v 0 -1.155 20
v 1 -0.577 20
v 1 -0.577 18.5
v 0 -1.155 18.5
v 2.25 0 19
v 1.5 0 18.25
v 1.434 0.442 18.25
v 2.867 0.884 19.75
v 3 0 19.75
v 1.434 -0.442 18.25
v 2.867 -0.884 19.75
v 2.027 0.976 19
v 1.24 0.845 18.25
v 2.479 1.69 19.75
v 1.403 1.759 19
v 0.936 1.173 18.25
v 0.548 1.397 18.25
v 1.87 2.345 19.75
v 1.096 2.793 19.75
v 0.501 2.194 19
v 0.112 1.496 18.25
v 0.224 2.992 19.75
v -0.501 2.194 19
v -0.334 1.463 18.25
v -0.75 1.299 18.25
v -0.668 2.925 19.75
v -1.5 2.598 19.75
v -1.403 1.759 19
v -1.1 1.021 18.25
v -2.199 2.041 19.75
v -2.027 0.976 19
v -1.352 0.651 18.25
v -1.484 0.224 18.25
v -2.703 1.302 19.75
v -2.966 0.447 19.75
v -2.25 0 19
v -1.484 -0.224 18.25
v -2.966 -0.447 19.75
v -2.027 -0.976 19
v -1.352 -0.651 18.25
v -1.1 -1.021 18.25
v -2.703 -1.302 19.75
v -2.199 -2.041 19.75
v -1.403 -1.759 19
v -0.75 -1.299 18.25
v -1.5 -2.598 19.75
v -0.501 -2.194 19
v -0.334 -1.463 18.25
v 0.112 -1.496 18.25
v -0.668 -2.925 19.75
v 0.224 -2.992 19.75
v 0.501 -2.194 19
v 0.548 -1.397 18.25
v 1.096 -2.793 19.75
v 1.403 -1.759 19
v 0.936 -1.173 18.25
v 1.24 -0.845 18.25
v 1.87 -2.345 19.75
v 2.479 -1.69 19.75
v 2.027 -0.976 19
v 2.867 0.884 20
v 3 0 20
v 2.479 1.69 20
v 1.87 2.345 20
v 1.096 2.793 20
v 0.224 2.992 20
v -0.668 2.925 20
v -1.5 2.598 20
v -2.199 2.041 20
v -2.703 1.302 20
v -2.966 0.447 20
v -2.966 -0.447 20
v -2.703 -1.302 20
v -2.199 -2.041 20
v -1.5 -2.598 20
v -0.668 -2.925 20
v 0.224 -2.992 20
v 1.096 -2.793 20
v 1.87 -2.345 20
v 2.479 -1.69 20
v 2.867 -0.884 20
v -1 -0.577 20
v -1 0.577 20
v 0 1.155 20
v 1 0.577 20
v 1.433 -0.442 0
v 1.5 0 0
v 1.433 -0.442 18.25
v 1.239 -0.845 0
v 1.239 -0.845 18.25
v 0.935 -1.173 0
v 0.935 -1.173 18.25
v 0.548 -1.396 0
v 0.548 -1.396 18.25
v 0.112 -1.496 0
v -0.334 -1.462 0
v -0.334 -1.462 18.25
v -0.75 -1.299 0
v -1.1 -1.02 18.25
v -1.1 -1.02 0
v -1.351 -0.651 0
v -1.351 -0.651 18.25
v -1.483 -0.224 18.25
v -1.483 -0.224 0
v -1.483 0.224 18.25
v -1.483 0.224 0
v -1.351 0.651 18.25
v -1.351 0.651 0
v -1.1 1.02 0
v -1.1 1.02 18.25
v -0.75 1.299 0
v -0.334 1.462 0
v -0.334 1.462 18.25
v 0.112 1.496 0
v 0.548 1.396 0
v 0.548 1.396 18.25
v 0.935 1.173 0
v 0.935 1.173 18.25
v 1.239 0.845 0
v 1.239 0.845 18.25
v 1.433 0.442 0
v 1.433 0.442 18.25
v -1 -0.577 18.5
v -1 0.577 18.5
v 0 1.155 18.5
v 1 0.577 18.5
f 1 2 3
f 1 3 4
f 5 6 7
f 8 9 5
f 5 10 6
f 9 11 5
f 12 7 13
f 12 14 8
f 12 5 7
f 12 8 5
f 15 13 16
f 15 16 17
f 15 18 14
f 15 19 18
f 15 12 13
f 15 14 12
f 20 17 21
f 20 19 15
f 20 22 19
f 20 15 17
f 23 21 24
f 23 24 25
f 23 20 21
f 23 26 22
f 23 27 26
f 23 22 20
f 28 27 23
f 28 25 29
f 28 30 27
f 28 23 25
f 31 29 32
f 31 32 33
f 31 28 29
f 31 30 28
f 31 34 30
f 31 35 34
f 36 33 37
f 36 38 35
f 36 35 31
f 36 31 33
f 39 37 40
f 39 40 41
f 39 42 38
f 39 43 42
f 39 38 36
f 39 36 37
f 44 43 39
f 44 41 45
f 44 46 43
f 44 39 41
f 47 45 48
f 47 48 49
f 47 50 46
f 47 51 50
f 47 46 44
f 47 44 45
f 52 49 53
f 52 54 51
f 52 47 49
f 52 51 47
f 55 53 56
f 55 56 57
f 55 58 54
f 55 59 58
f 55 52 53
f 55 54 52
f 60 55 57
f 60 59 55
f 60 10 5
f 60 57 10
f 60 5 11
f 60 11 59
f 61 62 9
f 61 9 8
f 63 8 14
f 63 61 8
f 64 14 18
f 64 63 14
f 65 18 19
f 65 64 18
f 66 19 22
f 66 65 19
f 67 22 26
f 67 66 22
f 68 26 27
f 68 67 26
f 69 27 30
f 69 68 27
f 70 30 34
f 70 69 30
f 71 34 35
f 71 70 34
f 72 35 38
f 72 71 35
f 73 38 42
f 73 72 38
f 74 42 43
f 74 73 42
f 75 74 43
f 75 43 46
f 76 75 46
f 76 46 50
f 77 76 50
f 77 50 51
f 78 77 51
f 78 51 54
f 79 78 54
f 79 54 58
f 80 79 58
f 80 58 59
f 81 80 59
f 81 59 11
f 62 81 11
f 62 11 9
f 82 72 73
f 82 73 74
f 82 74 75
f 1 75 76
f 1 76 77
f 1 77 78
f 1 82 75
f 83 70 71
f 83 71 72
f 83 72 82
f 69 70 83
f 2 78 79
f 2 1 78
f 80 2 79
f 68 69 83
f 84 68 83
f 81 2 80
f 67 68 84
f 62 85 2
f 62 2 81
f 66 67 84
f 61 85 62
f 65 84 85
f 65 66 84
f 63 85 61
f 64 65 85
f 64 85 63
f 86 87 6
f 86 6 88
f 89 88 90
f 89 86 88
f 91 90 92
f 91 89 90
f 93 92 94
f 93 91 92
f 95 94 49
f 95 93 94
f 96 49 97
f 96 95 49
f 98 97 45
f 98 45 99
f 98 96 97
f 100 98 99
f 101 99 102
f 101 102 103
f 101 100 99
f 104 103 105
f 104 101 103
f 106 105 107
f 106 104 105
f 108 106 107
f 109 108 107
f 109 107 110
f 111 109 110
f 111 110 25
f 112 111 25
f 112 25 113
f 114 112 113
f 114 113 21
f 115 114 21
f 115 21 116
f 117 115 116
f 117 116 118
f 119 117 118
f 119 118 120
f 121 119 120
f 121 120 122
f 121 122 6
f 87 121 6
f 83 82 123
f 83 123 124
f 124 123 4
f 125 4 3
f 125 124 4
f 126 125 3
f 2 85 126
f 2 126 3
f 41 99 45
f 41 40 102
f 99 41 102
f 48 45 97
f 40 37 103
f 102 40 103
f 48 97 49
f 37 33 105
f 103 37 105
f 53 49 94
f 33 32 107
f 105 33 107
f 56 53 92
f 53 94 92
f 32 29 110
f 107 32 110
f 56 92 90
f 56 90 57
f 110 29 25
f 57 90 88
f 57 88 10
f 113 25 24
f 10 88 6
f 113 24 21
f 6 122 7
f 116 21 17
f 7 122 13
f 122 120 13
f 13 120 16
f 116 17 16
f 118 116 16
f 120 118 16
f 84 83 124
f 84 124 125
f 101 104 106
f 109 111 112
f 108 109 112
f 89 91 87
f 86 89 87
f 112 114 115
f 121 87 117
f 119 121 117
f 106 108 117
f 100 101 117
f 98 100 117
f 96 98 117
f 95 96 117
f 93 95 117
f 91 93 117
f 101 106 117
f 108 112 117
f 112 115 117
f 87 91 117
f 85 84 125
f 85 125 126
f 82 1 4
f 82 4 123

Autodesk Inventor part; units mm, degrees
ref_plane "YZ Plane" through (0, 0, 0) normal (1, 0, 0) x (0, 1, 0)
ref_plane "XZ Plane" through (0, 0, 0) normal (0, 1, 0) x (-1, 0, 0)
ref_plane "XY Plane" through (0, 0, 0) normal (0, 0, 1) x (1, 0, 0)
sketch "スケッチ1" plane through (0, 0, 0) normal (0, 0, 1) x (1, 0, 0)
  circle A0 centre (0, 0) radius 1.5
  dimension "d0" = 3
extrude "押し出し1" add sketch "スケッチ1" along normal blind 20
thread "ねじ1" size "M3x0.5" class "6g" standard "ANSI Metric M Profile" full length
sketch "スケッチ2" plane through (0, 0, 20) normal (0, 0, 1) x (1, 0, 0)
  circle A0 centre (0, 0) radius 3
  dimension "d5" = 6
extrude "押し出し2" add sketch "スケッチ2" against normal blind 1.75
chamfer "面取り1" distance 1.5 angle 45 1 edges at (-3, 0, 18.25)
sketch "スケッチ3" plane through (0, 0, 20) normal (0, 0, 1) x (1, 0, 0)
  line L0 (0, 1.1547) -> (1, 0.5774)
  line L1 (1, 0.5774) -> (1, -0.5774)
  line L2 (1, -0.5774) -> (0, -1.1547)
  line L3 (0, -1.1547) -> (-1, -0.5774)
  line L4 (-1, -0.5774) -> (-1, 0.5774)
  line L5 (-1, 0.5774) -> (0, 1.1547)
  point P0 (0, 0)
  point P1 (0, 0)
  dimension "d11" = 2
extrude "押し出し3" cut sketch "スケッチ3" against normal blind 1.5
properties part number "m3皿ネジ　２０" material "鉄 灰色"
